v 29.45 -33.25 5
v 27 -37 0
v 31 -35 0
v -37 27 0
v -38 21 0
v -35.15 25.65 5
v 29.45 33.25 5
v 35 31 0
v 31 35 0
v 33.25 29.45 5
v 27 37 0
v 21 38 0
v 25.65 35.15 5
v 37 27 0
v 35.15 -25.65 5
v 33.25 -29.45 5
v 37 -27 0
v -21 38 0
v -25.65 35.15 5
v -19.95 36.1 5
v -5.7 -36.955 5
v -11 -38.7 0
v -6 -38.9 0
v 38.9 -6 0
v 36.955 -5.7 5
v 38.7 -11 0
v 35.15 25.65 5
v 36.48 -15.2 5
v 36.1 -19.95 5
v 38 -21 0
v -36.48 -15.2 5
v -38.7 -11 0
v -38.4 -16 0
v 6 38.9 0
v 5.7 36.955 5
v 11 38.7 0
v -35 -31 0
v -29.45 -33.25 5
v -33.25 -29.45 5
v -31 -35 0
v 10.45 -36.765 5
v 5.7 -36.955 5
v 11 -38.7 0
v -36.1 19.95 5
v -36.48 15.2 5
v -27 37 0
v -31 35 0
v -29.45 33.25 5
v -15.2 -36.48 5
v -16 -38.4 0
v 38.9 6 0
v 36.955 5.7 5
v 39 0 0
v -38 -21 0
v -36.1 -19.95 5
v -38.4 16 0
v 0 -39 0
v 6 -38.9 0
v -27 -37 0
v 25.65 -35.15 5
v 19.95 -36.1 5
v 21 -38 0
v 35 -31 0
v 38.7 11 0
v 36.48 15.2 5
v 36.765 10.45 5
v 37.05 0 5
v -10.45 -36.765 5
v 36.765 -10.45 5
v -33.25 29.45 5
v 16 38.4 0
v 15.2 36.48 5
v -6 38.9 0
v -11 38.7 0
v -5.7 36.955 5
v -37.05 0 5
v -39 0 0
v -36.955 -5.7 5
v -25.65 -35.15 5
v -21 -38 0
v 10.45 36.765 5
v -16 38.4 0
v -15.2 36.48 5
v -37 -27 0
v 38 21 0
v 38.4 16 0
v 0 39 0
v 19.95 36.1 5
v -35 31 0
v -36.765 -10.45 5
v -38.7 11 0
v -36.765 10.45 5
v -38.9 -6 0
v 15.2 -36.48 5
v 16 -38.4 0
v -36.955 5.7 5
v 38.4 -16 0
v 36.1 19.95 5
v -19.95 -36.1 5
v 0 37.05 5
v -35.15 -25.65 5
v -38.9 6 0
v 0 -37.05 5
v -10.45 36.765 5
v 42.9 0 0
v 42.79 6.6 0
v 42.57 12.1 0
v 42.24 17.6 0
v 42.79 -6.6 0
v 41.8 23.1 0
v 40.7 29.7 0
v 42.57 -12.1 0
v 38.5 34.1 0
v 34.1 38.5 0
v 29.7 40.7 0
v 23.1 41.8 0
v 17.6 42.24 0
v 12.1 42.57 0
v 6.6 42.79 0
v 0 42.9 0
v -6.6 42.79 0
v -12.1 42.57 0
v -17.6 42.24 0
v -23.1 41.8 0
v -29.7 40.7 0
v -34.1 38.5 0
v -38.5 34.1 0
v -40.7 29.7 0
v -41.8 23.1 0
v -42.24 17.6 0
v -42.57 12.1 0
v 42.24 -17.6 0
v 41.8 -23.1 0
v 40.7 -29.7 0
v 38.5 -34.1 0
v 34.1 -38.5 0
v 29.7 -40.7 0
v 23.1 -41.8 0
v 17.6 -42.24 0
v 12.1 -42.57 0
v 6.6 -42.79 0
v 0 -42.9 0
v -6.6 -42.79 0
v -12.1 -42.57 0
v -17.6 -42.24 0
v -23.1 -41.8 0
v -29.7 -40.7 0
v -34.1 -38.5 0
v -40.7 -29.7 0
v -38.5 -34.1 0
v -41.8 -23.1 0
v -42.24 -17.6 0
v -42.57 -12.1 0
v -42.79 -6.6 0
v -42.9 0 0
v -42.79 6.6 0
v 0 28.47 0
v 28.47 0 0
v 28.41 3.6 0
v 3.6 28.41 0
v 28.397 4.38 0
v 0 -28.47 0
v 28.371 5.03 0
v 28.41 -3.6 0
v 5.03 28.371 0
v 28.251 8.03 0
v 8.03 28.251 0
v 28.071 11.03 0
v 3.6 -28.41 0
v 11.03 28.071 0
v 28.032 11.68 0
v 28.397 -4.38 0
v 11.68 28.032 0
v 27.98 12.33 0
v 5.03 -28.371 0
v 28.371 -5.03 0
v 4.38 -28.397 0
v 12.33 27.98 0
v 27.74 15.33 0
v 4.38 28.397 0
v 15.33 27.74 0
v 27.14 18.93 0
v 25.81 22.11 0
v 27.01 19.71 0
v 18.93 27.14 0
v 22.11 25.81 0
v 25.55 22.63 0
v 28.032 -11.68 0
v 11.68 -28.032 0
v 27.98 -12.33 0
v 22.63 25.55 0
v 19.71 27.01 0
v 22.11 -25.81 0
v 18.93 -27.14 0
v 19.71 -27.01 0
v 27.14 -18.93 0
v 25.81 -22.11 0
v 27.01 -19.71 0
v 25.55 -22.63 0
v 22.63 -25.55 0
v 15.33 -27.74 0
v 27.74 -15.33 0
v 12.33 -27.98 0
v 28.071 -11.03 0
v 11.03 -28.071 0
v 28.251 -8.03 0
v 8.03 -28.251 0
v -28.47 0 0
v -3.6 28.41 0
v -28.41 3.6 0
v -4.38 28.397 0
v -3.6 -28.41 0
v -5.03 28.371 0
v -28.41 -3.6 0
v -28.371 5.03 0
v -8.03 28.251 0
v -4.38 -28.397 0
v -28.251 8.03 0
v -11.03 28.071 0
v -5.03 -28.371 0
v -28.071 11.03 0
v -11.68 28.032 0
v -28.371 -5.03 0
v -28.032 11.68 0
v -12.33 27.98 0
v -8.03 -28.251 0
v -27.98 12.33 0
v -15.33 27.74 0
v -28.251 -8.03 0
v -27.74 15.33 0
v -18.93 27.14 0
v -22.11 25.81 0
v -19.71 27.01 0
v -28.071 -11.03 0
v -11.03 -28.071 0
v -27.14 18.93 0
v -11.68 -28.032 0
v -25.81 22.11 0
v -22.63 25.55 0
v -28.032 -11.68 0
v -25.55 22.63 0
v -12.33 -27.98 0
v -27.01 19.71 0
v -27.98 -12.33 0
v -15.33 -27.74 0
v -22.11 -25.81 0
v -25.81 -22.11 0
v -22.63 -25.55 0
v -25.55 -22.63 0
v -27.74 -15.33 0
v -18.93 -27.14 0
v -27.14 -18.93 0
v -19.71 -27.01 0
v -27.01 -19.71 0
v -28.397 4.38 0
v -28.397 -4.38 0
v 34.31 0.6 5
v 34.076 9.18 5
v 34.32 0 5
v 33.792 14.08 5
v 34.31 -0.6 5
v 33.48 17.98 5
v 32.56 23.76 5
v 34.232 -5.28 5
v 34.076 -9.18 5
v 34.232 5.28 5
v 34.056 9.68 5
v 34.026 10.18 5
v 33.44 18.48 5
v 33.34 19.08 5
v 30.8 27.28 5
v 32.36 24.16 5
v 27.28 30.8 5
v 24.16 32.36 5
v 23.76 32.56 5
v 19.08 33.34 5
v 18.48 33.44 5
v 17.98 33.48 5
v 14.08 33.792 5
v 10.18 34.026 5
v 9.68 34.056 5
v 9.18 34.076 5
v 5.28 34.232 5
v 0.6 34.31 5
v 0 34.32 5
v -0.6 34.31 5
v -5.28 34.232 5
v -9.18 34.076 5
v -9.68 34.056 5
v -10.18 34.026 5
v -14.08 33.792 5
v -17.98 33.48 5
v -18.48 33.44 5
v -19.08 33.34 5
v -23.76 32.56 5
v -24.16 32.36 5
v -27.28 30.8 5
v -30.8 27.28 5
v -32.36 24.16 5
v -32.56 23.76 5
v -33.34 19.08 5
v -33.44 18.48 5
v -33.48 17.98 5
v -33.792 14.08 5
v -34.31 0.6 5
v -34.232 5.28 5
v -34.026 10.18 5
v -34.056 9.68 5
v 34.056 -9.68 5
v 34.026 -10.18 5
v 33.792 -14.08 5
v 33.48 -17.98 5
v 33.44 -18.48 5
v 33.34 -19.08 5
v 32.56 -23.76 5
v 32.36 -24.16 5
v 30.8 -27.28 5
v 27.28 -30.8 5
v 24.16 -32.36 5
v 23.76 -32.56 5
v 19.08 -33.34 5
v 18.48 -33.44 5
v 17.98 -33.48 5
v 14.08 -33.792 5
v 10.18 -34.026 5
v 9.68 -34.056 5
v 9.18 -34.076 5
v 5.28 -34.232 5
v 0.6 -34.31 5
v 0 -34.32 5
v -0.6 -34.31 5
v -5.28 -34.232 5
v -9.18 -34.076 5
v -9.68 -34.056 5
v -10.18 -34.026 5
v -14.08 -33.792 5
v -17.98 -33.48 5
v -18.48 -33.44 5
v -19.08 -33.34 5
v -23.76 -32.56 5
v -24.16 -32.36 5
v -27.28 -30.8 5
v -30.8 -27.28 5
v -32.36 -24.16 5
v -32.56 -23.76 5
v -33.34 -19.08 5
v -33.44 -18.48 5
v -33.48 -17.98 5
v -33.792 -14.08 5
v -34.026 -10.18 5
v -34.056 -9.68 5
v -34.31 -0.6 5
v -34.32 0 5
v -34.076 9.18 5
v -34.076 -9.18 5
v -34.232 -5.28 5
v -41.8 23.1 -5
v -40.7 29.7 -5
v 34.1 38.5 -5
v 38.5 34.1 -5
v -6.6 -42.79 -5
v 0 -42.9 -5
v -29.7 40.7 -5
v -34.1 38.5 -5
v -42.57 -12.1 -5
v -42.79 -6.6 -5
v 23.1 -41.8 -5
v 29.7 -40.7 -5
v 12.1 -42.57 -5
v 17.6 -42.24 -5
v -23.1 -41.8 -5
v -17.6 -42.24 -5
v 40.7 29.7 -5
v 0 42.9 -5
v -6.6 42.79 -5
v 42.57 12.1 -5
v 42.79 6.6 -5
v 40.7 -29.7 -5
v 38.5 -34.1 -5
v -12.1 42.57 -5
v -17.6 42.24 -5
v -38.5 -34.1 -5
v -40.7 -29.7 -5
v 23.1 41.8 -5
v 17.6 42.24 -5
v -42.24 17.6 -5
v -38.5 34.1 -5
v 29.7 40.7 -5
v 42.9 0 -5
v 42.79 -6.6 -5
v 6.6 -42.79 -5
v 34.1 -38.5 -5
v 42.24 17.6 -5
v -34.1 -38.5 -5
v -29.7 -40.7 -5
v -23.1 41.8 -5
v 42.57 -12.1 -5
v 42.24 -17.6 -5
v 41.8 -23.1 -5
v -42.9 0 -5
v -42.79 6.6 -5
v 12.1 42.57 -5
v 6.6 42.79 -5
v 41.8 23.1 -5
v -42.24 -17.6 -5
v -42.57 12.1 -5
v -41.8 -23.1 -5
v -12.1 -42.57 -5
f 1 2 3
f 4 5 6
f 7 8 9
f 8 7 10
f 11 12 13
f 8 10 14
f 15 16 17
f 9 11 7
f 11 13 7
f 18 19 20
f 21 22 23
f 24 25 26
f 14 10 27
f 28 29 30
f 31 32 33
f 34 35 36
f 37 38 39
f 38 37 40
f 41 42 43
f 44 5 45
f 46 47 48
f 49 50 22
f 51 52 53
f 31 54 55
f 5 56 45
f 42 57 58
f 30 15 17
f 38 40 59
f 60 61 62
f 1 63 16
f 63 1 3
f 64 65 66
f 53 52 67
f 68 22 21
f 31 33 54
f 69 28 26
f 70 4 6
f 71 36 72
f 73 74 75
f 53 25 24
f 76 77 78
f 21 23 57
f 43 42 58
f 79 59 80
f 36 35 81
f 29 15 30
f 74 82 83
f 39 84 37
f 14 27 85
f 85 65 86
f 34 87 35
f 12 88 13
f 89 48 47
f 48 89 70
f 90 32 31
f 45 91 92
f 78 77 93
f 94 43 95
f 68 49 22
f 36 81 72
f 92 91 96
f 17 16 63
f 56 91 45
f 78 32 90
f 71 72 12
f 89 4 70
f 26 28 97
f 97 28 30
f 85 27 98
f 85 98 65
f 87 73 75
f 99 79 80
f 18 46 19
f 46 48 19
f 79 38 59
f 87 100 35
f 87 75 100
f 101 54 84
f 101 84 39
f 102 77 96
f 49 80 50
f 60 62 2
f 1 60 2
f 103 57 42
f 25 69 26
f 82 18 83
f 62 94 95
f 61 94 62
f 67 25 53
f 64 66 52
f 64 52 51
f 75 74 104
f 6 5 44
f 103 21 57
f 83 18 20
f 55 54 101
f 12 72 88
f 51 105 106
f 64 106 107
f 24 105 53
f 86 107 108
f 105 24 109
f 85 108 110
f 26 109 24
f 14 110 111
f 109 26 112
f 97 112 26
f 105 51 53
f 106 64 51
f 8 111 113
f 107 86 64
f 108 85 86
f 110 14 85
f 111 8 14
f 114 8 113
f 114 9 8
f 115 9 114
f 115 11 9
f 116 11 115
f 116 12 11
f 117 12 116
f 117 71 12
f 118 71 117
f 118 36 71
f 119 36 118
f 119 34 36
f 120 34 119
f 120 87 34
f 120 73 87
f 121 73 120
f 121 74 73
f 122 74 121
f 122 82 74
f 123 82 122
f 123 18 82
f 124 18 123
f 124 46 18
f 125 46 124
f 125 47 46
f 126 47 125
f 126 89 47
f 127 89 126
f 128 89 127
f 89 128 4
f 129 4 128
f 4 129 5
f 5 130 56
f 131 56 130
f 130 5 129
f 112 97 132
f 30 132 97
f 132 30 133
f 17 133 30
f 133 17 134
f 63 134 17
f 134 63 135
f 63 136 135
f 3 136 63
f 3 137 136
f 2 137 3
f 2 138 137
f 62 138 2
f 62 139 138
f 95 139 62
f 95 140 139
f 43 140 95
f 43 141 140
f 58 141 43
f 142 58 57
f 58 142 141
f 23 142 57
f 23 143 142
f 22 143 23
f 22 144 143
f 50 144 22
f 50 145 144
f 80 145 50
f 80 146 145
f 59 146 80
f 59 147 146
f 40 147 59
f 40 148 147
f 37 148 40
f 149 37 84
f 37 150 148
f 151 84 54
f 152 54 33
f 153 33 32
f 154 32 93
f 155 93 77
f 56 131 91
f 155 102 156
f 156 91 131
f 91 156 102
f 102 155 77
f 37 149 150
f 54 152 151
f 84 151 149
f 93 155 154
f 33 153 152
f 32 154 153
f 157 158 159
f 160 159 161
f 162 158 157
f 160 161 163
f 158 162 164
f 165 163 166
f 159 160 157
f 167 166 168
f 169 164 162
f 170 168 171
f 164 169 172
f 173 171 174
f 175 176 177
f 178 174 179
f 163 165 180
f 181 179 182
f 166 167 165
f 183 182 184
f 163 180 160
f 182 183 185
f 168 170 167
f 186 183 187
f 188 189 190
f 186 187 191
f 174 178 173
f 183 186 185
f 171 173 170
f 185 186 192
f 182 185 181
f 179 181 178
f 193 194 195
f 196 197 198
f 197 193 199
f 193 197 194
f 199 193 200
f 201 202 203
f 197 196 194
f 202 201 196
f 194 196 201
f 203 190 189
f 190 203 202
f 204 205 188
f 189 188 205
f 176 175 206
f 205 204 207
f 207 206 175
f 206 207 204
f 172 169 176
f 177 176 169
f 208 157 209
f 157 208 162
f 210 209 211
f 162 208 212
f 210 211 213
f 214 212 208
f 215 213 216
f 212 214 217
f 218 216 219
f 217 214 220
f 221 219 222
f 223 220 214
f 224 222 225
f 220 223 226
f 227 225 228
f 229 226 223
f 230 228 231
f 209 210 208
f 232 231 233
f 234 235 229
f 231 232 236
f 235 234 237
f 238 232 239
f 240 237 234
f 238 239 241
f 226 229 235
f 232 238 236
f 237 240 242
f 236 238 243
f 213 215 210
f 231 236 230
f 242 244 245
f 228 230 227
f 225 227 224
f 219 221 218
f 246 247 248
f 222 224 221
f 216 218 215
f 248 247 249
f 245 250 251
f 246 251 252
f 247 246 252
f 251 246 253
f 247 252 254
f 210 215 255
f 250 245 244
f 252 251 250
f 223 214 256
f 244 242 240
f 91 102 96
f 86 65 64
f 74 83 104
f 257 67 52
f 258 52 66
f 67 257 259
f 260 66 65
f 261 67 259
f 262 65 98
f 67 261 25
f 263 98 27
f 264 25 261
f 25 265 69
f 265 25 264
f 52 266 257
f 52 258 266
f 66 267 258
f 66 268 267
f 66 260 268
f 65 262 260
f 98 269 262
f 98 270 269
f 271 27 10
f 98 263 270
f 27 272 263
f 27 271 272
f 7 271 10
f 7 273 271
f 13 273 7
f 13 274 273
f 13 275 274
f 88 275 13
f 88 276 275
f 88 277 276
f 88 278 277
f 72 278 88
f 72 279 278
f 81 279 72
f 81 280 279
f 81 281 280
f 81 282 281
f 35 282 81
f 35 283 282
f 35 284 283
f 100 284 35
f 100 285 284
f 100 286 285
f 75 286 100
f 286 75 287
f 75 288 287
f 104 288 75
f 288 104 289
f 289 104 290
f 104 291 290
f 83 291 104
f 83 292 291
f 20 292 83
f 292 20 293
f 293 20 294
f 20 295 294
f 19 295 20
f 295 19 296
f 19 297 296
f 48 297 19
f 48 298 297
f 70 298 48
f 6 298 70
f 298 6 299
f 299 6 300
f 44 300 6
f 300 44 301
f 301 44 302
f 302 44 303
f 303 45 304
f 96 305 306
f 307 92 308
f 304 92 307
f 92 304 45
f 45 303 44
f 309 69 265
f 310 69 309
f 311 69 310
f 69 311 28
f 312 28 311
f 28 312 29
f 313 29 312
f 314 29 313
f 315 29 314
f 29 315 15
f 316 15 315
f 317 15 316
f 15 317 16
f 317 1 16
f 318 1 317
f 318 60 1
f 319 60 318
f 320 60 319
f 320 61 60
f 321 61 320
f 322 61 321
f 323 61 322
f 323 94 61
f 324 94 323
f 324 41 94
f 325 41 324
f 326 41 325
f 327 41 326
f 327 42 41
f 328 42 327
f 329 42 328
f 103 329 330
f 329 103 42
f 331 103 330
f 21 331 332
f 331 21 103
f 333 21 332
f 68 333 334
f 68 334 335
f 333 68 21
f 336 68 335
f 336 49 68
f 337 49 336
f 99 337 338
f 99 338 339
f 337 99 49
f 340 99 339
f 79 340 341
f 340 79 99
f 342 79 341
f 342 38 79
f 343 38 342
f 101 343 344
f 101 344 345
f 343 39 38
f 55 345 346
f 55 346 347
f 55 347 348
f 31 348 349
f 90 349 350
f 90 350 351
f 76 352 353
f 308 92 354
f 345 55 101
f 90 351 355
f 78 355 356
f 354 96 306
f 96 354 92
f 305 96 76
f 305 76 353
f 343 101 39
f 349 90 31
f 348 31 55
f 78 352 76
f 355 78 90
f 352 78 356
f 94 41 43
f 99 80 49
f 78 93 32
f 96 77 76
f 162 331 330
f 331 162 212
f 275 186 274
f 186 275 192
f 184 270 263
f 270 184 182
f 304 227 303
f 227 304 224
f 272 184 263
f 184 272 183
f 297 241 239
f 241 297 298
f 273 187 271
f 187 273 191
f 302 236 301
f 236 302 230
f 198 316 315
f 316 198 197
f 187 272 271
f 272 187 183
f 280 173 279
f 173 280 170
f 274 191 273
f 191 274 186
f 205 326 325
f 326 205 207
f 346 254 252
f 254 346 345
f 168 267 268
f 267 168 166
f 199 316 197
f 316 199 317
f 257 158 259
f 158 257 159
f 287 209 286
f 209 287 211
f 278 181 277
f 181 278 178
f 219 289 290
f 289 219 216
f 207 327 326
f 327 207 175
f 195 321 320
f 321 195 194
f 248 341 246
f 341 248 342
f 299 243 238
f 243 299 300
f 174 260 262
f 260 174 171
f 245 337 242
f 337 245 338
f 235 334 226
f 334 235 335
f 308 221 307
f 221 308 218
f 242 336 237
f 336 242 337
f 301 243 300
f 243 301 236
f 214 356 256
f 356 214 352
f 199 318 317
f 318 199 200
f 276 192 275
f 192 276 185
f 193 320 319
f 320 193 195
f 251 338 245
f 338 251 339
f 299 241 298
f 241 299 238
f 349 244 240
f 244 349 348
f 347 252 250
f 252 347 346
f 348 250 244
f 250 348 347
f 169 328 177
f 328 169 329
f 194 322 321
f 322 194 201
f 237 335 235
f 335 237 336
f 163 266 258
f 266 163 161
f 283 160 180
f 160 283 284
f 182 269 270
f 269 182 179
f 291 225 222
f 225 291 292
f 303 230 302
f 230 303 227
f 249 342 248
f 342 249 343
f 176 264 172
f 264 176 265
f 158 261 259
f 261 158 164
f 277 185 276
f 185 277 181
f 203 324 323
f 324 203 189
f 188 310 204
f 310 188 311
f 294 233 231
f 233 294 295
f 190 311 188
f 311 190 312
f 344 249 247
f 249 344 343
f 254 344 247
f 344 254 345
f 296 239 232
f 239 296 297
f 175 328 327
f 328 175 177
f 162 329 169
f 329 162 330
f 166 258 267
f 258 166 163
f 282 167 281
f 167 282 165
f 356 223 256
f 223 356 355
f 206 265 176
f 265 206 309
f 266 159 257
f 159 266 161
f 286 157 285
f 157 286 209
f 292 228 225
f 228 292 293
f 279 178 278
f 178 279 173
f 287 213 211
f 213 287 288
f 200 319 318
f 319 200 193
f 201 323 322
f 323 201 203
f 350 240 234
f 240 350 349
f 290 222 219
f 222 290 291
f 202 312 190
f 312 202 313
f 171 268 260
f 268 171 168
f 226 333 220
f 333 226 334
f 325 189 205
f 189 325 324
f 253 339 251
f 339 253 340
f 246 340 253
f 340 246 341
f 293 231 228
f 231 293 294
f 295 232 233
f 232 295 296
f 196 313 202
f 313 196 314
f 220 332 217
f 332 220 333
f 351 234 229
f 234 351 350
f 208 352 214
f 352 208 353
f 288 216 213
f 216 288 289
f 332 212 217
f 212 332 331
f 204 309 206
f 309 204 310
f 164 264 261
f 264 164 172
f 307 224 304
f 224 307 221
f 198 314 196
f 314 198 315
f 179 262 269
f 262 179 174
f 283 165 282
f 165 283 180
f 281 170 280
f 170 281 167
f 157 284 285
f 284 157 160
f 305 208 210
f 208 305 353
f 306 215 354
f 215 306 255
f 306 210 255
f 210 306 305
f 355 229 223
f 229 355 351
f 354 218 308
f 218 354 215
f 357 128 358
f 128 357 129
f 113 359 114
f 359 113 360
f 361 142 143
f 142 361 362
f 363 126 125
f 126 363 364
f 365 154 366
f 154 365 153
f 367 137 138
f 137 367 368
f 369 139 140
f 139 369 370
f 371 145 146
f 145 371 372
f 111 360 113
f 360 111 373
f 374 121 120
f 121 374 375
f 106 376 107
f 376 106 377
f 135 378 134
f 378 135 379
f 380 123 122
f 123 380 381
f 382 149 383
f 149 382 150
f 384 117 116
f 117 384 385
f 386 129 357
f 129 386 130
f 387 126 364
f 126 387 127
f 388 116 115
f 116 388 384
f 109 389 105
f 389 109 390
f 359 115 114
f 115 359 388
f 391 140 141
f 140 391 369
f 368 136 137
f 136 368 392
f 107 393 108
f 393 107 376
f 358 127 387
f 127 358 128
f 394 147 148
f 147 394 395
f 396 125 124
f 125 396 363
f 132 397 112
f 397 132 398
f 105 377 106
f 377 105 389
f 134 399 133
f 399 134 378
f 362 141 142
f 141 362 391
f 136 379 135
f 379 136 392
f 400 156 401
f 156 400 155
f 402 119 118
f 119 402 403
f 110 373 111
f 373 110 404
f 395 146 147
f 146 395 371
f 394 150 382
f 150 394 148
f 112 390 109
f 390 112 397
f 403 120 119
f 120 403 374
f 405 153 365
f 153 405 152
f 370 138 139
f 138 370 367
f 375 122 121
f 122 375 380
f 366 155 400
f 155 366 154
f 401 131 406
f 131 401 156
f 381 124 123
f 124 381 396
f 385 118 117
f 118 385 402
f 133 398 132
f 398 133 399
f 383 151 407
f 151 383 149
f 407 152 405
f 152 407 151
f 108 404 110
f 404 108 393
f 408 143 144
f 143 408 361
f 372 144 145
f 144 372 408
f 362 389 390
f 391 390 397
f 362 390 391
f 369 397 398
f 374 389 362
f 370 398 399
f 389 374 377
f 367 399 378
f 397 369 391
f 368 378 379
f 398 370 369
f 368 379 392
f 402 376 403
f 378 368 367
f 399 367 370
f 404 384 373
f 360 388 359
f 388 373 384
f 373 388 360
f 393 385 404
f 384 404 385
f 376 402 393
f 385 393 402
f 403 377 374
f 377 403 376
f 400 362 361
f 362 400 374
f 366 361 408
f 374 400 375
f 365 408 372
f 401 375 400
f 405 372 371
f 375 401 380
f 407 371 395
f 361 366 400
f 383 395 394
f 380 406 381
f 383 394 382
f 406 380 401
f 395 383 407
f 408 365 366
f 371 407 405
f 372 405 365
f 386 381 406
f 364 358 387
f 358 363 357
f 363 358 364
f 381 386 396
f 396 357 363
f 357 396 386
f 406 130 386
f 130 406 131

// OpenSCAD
$fn = 100;

module halb_viertel_becher_innenumfang()
{

    polygon(points = [
        [ 0, 0 ],
        [ 39, 0 ],
        [ 38.2, 08 ],
        [ 37, 19 ],
        [ 36, 26.5 ],
        [ 35, 30 ],
        [ 33, 33 ],
        [ 31, 35 ],
        [ 27, 37 ],
        [ 21, 38 ],
        [ 16, 38.4 ],
        [ 11, 38.7 ],
        [ 6, 38.9 ],
        [ 0, 39 ],
    ]);
}

module viertel_becher_innenumfang()
{
    mirror([ 1, -1 ])
    {
        halb_viertel_becher_innenumfang();
    }
    halb_viertel_becher_innenumfang();
}

module becher_innenumfang()
{
    rotate(a = 0) viertel_becher_innenumfang();
    rotate(a = 90) viertel_becher_innenumfang();
    rotate(a = 180) viertel_becher_innenumfang();
    rotate(a = 270) viertel_becher_innenumfang();
}

module lid_base()
{
    // scale 110% in x and y
    // should be about +4ms on each side
    scale([ 1.1, 1.1, 1 ])
    {
        linear_extrude(height = 5)
        {
            becher_innenumfang();
        }
    }
}

module lid_wedge()
{
    difference()
    {
        linear_extrude(height = 5, scale = 0.95)
        {
            becher_innenumfang();
        }
        translate([0,0,-1]) 
        {
            linear_extrude(height = 7, scale = 1.3)
            {
                scale([ 0.7, 0.7, 1 ]) becher_innenumfang();
            }
        }
    }
}

module yogurt_lid()
{
    scale([ 1, 1, -1 ]) lid_base();
    lid_wedge();
}

yogurt_lid();
